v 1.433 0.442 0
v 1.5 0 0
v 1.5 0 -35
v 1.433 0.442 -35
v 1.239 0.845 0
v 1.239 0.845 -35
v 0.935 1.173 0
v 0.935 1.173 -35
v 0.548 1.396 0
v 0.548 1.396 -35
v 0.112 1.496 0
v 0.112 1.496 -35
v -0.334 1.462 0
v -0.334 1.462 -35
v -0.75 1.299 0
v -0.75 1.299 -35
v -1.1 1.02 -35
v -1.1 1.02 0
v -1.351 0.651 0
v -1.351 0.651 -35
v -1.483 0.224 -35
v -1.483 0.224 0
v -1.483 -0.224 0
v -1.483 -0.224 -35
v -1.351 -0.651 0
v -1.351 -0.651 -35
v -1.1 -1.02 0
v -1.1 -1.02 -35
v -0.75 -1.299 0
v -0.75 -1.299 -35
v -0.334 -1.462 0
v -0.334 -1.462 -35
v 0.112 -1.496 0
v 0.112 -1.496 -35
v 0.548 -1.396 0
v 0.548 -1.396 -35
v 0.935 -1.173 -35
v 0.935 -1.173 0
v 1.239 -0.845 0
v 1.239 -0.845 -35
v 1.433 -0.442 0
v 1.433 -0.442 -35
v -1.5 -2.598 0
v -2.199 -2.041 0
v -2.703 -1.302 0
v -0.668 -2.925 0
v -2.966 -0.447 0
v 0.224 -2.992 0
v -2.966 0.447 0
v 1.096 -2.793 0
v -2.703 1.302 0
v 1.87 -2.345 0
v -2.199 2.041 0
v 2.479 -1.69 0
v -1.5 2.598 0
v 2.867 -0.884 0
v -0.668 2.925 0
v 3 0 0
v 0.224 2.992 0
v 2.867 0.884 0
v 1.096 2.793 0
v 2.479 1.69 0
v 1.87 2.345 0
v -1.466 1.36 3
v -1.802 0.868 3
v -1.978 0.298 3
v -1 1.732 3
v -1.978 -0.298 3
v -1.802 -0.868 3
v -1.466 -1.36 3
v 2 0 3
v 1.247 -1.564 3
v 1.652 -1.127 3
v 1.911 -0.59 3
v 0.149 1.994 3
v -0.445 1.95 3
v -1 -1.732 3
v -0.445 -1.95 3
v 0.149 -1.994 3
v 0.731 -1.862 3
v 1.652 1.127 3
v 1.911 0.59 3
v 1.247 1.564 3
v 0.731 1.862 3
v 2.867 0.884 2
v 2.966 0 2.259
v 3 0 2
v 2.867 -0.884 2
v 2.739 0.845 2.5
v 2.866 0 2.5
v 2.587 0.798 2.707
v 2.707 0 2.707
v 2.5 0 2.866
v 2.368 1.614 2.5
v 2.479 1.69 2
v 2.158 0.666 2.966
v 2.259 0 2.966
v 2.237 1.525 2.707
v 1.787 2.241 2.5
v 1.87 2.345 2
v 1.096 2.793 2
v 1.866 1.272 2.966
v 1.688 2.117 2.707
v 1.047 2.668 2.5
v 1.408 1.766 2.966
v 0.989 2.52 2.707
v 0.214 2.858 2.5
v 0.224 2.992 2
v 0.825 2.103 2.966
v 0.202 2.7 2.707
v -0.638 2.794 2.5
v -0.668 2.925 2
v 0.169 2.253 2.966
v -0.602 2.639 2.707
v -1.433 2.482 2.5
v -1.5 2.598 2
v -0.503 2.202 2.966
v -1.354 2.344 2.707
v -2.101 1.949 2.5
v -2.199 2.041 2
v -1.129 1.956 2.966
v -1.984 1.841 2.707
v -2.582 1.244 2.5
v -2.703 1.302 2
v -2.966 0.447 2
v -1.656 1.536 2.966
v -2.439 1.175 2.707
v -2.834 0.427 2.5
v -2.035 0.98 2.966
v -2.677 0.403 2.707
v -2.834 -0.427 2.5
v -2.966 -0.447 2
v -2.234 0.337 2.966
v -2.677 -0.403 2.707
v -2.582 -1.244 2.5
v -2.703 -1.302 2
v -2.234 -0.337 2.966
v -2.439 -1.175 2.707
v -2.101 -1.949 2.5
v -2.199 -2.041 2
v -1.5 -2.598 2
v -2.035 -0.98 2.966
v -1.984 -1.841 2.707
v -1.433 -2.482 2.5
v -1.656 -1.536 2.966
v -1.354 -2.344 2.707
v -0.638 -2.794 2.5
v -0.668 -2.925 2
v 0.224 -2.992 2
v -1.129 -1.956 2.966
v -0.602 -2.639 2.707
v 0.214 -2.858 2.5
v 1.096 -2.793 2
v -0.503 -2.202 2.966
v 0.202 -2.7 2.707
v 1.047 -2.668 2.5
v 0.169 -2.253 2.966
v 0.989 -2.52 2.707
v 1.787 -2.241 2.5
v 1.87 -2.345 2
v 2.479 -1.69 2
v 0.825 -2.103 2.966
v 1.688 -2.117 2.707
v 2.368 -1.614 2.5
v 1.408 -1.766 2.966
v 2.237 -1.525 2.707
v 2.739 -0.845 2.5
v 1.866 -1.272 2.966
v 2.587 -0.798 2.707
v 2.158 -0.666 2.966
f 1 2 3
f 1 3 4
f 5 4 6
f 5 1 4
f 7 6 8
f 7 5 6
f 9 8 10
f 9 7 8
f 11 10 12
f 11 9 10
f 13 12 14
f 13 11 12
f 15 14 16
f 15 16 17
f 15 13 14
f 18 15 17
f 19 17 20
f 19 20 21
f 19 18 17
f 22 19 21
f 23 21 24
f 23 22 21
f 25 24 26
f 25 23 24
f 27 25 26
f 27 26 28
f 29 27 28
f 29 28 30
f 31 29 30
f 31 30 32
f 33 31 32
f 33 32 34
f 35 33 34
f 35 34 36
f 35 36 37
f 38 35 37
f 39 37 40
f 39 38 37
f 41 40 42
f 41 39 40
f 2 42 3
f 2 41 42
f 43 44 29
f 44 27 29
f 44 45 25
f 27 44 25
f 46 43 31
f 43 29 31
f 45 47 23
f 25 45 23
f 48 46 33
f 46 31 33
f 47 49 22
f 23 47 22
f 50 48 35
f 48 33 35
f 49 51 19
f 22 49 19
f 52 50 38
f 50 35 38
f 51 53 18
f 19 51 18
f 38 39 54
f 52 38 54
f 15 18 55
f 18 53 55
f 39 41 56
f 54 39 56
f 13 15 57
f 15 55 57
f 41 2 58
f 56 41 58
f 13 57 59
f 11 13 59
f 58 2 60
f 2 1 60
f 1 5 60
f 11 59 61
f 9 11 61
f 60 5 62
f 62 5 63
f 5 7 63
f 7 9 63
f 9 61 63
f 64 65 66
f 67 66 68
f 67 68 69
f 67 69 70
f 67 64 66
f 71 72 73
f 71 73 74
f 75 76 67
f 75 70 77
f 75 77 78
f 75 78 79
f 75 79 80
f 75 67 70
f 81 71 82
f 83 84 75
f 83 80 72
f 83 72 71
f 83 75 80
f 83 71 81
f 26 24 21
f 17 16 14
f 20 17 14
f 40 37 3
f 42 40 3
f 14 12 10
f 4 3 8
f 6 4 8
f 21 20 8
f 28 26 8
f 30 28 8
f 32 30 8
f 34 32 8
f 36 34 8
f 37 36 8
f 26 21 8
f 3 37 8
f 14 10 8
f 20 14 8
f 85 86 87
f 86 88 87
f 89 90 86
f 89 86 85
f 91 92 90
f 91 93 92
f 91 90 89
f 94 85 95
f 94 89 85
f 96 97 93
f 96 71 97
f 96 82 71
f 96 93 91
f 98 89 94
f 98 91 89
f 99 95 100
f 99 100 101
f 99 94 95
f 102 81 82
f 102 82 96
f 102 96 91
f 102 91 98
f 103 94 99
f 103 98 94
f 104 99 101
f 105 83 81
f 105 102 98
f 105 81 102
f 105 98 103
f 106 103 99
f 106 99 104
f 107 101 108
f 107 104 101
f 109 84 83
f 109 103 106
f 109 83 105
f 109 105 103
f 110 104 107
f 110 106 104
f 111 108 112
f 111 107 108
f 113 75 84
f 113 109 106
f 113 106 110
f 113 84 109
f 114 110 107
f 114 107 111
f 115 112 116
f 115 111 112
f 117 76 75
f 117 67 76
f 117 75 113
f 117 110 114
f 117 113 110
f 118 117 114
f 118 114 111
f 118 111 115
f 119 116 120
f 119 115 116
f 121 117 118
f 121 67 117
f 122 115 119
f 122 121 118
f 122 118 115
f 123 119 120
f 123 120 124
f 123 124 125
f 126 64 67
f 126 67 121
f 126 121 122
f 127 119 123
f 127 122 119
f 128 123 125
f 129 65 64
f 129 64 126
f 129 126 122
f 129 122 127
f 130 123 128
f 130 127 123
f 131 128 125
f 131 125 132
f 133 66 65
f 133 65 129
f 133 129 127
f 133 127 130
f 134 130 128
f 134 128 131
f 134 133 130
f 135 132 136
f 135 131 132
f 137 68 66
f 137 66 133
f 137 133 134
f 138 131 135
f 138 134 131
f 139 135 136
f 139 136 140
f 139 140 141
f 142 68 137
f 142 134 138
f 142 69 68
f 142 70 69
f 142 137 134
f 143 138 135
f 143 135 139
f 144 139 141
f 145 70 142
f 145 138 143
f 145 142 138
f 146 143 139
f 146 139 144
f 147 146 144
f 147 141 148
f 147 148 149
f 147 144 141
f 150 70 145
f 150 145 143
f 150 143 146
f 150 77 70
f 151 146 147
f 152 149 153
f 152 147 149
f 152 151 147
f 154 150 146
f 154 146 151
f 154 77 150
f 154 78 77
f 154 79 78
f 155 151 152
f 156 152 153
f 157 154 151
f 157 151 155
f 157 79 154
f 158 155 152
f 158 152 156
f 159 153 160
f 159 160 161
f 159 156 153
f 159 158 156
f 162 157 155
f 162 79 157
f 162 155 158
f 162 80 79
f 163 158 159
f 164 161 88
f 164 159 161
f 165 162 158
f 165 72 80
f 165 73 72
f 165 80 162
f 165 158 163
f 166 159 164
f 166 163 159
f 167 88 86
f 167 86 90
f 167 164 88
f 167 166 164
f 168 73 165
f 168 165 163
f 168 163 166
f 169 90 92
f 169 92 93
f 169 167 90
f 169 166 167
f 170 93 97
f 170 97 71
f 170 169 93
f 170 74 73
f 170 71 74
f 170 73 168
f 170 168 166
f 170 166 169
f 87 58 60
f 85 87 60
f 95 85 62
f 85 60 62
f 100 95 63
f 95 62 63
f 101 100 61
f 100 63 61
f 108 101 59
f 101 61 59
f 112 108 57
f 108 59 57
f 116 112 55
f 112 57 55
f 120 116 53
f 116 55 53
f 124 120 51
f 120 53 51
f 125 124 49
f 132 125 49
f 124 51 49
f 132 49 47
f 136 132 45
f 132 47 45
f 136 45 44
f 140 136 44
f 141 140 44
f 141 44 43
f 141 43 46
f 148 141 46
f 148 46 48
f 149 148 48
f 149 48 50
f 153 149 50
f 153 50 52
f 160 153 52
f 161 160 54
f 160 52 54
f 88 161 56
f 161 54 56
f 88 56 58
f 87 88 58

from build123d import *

# Parameters (mm, degrees)
SKETCH1_R           = 1.5
BOSS_EXTRUDE1_DEPTH = 35
SKETCH2_R           = 3
BOSS_EXTRUDE2_DEPTH = 3
FILLET1_R           = 1


with BuildPart() as part:
    # Sketch1 → Boss-Extrude1 (new body)
    with BuildSketch(Plane.XY):
        Circle(SKETCH1_R)
    extrude(amount=-BOSS_EXTRUDE1_DEPTH)

    # Sketch2 → Boss-Extrude2 (add)
    with BuildSketch(Plane.XY):
        Circle(SKETCH2_R)
    extrude(amount=BOSS_EXTRUDE2_DEPTH)

    # Fillet1
    fillet1_edges = [part.edges().sort_by_distance(p)[0] for p in [
        (-3, 0, 3),
    ]]
    fillet(fillet1_edges, radius=FILLET1_R)


solid = part.part
